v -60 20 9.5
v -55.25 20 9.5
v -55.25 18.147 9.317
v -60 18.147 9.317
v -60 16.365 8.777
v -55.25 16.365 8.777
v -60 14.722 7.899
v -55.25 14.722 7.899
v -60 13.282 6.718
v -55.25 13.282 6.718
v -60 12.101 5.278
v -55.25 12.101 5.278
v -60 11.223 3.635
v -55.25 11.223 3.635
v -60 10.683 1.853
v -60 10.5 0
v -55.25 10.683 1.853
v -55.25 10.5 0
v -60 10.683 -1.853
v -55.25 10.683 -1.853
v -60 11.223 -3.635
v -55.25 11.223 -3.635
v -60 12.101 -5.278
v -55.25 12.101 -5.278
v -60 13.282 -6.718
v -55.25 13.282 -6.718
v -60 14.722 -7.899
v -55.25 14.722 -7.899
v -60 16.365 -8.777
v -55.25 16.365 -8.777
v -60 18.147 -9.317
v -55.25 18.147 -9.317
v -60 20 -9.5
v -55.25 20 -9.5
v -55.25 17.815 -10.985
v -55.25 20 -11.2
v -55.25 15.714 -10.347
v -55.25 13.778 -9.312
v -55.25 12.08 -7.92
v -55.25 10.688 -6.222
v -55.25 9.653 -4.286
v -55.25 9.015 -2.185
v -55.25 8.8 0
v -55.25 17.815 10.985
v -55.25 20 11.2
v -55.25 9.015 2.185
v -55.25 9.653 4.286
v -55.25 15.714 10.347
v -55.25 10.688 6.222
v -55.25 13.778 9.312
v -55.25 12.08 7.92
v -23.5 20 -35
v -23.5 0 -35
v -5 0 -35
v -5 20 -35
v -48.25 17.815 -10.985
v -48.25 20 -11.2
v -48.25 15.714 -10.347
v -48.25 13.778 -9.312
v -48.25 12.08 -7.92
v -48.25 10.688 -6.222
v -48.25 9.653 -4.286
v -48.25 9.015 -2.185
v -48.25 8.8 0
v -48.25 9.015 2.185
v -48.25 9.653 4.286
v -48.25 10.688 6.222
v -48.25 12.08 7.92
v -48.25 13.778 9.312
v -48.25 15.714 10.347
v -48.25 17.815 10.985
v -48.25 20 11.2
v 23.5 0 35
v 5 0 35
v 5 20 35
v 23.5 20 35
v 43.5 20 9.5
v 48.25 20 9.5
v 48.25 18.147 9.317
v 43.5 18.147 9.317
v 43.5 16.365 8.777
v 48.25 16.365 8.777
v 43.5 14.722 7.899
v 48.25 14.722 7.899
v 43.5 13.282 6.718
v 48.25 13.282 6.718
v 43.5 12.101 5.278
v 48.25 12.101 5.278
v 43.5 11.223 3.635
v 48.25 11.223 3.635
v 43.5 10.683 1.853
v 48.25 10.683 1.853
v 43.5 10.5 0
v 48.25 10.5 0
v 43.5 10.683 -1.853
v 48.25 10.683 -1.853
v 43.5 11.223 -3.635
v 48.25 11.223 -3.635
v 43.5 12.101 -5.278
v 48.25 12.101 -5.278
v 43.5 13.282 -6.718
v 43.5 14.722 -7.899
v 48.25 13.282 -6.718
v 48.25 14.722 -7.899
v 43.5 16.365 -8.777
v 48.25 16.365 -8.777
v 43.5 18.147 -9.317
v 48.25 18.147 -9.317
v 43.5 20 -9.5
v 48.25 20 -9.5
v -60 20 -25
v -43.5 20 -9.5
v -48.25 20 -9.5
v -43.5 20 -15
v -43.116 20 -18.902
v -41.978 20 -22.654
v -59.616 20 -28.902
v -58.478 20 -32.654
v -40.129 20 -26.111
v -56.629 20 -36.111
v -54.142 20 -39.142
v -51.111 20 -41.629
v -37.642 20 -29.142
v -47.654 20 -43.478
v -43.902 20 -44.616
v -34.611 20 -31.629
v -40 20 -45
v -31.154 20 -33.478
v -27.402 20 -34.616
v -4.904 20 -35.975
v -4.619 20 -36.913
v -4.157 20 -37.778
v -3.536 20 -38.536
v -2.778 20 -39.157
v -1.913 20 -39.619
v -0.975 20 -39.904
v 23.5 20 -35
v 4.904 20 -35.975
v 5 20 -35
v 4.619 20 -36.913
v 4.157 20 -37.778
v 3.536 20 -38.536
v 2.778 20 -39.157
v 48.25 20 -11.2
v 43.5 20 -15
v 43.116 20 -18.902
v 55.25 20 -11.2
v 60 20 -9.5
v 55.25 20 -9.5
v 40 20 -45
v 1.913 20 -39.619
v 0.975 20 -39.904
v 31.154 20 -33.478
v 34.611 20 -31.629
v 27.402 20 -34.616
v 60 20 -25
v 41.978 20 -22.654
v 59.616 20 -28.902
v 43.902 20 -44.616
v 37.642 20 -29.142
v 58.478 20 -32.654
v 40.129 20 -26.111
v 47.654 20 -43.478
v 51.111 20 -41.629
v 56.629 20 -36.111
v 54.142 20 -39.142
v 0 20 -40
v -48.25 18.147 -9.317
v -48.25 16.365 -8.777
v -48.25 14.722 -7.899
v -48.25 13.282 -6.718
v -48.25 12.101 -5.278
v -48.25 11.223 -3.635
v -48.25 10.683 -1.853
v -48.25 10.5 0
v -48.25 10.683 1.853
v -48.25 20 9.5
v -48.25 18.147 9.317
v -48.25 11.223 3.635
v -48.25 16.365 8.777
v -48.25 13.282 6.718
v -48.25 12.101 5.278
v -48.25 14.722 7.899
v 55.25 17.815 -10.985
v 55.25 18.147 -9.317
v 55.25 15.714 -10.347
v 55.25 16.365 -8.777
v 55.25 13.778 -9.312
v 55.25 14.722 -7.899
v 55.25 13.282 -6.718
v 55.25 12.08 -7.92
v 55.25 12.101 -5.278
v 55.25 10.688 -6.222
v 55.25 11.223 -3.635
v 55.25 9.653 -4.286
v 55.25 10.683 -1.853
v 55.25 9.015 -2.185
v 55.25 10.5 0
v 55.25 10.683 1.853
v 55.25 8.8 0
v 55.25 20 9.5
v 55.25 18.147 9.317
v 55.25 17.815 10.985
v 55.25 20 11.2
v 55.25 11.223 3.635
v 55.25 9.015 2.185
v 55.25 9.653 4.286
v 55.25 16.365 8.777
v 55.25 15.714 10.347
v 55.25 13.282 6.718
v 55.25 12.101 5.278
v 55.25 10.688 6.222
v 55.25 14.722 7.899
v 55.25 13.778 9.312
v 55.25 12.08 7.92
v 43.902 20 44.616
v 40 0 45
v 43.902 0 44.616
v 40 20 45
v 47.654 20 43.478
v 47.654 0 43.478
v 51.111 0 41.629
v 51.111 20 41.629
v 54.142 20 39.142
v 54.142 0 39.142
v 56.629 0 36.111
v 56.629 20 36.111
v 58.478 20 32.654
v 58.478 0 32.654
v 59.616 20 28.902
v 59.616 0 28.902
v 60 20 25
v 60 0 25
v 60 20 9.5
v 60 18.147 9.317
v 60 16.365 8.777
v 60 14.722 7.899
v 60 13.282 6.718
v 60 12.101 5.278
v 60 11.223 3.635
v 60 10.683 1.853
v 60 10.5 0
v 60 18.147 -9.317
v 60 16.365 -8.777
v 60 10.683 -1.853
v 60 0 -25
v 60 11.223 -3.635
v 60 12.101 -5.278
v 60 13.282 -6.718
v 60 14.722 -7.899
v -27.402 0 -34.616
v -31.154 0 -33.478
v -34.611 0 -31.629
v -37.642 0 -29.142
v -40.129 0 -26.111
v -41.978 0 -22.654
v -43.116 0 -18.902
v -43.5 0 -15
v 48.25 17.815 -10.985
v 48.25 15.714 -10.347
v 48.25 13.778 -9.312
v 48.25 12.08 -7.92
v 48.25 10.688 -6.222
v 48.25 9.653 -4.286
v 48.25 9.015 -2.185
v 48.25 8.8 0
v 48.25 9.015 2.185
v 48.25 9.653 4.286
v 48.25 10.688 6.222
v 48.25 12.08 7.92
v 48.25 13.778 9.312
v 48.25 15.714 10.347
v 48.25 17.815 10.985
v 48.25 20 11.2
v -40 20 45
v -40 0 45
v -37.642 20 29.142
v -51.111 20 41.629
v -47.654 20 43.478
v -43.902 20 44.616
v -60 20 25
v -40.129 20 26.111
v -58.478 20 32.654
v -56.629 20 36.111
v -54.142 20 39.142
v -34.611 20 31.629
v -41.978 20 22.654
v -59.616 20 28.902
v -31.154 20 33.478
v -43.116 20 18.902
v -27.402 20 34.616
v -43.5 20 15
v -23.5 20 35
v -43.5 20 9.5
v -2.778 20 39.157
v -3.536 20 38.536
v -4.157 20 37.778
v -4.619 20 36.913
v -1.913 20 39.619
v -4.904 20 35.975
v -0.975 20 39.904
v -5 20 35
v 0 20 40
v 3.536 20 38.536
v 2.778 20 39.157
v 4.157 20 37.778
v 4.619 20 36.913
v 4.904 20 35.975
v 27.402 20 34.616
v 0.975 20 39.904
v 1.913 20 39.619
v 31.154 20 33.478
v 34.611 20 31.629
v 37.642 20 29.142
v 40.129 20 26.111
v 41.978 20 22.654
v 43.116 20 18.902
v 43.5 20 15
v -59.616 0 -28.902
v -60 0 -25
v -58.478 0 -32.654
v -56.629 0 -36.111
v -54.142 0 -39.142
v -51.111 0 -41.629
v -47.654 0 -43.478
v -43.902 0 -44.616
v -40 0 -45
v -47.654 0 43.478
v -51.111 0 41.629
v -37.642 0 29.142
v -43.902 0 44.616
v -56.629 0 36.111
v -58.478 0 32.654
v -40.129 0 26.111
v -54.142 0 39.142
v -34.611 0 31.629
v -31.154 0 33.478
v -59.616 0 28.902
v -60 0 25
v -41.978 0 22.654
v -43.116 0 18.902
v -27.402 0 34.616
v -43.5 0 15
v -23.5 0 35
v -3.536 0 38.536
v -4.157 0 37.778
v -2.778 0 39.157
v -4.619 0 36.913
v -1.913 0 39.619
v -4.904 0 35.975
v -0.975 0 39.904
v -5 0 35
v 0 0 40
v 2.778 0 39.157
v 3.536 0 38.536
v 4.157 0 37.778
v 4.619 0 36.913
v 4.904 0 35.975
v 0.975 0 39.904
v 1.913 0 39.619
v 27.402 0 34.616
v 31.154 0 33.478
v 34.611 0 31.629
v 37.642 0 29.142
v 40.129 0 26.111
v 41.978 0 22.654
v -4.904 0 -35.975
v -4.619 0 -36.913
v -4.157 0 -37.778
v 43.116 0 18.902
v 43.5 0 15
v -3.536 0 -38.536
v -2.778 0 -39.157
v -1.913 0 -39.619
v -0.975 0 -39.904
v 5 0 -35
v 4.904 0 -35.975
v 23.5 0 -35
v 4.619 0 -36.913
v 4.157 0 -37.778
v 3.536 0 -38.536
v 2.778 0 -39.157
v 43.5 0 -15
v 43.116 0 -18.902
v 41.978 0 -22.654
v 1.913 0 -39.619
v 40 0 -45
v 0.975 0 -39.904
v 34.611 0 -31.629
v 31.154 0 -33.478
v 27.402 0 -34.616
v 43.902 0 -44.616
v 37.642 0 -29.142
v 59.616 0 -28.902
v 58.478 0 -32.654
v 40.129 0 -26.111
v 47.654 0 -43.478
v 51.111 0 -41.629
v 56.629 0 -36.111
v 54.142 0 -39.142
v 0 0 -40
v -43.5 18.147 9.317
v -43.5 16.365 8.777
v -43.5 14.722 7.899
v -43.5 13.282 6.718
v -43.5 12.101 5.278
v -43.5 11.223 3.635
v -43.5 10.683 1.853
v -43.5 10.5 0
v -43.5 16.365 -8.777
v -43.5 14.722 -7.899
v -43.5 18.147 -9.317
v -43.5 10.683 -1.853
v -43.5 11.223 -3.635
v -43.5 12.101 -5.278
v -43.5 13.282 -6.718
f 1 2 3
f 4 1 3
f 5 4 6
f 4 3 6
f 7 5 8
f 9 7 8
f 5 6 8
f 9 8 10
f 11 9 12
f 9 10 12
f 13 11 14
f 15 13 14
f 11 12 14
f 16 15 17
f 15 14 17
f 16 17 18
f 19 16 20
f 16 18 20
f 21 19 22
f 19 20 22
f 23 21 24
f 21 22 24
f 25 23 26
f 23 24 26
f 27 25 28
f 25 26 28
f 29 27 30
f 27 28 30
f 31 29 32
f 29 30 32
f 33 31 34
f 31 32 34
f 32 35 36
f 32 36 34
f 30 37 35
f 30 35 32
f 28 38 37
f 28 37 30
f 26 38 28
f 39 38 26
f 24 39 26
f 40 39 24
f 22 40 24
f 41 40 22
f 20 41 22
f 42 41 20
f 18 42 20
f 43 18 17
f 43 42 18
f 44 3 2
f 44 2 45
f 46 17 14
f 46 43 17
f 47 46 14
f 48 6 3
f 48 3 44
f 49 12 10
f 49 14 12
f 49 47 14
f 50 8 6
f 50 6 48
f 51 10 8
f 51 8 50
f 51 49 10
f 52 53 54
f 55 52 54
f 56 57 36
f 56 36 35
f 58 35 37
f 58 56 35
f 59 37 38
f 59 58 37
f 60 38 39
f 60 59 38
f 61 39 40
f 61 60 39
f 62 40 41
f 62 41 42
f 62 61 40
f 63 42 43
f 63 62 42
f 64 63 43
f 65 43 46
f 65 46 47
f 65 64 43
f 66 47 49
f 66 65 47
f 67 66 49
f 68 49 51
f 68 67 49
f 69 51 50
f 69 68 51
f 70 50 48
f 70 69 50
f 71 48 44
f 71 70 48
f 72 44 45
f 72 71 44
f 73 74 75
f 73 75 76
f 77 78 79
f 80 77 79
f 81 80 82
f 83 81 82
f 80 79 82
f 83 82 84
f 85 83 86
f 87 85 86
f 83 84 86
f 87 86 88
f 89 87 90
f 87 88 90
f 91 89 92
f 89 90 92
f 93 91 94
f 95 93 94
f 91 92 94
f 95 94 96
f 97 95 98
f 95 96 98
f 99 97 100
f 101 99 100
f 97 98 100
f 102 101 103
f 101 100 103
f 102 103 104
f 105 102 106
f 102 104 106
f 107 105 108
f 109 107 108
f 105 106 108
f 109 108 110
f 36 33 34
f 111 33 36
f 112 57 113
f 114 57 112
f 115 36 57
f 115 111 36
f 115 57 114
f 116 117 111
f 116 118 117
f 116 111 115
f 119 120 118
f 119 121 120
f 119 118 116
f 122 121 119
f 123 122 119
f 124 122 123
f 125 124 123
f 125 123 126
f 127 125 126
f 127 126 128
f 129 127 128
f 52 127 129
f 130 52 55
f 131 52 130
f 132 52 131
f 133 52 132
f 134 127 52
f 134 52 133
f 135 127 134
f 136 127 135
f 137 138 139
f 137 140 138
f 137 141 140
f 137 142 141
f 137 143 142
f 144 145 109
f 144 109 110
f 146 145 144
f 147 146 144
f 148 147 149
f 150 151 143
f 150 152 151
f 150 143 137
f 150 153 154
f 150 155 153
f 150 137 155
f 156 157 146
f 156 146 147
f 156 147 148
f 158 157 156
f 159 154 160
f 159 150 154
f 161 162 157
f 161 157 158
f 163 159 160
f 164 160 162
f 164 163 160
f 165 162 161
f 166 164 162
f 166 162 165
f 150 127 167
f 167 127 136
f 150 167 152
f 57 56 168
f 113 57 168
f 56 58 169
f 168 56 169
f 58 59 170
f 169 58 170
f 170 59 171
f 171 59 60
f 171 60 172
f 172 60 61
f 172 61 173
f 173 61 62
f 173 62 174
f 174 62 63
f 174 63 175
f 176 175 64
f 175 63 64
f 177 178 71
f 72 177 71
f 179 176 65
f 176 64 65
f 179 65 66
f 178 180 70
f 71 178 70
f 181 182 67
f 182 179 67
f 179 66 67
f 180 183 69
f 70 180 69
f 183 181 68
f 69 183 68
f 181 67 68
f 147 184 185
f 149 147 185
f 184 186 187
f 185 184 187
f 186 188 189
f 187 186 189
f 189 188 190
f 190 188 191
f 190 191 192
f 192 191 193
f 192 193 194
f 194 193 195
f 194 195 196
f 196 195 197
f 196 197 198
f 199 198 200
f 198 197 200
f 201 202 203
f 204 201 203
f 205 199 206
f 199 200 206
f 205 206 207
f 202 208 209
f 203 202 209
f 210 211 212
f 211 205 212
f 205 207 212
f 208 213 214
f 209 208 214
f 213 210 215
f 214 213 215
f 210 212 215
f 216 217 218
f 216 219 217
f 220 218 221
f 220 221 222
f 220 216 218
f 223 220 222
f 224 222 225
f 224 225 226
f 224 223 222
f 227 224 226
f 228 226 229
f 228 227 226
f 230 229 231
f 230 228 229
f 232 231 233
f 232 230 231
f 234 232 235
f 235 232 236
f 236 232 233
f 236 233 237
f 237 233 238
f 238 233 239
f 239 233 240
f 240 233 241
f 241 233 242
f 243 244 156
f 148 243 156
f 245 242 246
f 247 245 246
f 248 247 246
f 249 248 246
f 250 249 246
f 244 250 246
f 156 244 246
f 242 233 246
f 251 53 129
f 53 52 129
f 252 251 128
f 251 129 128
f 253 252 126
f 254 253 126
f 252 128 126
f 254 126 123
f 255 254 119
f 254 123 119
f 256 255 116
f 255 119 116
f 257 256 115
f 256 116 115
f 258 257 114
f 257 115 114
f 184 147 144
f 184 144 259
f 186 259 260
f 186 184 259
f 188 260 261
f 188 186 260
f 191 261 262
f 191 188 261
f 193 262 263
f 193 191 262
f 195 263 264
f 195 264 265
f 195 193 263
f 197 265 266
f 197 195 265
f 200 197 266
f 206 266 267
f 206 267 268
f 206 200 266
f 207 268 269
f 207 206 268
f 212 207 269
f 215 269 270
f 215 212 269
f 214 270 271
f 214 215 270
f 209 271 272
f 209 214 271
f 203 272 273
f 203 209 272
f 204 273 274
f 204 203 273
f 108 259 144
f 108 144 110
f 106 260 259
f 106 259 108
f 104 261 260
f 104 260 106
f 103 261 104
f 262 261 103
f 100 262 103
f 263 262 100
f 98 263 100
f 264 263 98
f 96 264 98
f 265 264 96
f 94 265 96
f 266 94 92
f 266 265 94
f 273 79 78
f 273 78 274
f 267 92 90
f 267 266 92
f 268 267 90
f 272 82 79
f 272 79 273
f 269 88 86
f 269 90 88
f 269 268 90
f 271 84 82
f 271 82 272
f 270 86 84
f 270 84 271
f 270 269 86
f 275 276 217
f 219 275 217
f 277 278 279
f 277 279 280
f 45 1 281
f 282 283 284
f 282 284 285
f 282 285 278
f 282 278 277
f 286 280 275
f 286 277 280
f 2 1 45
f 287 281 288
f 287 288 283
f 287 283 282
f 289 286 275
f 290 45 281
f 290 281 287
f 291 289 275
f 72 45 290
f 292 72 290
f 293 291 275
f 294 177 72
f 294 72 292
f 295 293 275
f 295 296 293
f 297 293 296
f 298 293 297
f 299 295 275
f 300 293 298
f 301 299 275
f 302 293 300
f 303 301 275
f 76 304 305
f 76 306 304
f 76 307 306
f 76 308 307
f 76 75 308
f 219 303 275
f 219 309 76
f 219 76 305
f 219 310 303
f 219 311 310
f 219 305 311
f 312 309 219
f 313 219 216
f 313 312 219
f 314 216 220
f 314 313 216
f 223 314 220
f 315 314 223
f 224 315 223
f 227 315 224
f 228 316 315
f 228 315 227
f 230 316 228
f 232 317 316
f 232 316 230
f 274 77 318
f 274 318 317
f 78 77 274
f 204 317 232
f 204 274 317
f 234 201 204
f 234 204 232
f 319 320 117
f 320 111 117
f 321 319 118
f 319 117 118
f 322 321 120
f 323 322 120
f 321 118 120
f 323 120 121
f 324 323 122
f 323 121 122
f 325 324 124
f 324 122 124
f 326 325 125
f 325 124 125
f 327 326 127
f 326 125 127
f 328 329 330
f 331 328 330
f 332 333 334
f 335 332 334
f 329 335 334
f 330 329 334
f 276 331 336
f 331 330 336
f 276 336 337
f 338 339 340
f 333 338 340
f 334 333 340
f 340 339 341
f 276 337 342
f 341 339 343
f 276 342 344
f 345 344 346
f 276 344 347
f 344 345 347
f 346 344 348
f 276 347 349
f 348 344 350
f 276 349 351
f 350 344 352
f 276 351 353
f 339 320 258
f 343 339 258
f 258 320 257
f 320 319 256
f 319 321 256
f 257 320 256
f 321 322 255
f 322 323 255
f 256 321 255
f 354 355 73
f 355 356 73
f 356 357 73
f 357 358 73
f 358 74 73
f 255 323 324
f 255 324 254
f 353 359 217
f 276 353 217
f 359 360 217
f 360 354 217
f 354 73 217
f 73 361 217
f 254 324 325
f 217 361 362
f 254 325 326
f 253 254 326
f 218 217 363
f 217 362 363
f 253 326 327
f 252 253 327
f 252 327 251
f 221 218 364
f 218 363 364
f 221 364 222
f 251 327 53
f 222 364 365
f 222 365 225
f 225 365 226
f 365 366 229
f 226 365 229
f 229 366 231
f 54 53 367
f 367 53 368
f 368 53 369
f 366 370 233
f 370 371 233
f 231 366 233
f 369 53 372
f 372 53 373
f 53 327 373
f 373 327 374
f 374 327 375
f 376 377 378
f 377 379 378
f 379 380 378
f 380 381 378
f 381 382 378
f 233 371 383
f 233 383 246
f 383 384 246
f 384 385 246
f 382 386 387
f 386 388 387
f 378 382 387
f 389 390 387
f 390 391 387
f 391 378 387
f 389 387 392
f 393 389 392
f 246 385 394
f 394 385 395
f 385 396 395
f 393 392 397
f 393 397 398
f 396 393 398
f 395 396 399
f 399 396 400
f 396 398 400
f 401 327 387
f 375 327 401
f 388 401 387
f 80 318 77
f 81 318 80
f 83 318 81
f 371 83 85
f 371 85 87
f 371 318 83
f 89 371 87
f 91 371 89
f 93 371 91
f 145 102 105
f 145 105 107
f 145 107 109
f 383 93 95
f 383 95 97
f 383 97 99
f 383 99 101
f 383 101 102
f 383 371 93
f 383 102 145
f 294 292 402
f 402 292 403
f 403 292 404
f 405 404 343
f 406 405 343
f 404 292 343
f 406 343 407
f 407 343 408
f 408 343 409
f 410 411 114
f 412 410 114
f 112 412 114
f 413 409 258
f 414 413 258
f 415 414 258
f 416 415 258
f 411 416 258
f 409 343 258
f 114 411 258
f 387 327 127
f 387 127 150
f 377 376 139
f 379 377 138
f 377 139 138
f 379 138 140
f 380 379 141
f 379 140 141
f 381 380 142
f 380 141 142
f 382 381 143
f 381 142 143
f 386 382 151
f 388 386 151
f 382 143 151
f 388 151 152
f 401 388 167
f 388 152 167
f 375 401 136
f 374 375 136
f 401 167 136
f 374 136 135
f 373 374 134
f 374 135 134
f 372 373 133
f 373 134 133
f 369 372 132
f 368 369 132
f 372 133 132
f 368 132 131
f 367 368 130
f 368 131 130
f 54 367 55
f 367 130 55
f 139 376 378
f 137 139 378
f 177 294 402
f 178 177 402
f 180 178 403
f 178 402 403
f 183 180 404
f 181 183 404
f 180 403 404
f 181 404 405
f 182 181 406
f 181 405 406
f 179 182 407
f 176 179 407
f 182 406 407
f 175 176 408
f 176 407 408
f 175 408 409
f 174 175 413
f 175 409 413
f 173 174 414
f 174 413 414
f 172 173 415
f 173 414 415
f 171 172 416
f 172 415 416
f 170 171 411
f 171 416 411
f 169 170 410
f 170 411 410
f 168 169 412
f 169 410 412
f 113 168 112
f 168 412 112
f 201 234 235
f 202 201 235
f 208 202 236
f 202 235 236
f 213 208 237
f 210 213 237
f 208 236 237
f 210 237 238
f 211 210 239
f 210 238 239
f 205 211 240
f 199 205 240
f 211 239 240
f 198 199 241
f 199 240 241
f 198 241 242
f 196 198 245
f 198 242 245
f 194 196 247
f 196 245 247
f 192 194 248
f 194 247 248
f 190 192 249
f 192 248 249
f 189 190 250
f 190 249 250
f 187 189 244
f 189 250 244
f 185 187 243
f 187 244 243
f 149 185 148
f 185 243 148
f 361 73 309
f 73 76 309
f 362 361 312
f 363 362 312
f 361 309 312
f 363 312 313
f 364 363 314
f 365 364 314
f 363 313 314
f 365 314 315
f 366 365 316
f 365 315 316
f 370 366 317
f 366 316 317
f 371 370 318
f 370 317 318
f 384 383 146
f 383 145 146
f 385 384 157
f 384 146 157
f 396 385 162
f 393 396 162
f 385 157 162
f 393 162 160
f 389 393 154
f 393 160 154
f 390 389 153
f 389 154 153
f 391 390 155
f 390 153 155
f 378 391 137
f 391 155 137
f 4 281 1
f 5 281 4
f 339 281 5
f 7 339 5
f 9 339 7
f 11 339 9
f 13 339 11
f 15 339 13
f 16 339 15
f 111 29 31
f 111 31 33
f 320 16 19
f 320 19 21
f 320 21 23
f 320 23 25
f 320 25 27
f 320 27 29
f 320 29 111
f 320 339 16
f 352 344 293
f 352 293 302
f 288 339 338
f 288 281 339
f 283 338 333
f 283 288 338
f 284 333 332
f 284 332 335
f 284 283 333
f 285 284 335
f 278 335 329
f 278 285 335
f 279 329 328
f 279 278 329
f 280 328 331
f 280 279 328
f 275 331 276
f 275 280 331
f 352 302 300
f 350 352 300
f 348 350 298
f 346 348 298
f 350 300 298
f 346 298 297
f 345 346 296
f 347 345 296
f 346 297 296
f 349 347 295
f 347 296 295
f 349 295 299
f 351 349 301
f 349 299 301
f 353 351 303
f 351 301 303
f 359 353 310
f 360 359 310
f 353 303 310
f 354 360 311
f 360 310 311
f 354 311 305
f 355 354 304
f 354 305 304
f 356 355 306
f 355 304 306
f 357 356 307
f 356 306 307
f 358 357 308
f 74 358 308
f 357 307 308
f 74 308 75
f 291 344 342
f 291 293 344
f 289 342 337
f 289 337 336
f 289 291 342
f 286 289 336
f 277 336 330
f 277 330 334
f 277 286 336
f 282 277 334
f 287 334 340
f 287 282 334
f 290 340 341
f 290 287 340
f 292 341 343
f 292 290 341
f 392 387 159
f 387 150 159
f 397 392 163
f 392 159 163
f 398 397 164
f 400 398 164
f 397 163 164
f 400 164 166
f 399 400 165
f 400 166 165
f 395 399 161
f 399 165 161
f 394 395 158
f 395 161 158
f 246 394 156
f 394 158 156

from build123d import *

# Parameters (mm, degrees)
SKETCH2_W           = 120
SKETCH2_H           = 90
SKETCH2_W_2         = 87
SKETCH2_H_2         = 70
BOSS_EXTRUDE1_DEPTH = 20
SKETCH3_W           = 7
SKETCH3_H           = 11.2
SKETCH4_R           = 9.5
CUT_EXTRUDE1_DEPTH  = 121
FILLET1_R           = 20
SKETCH5_R           = 5
CUT_EXTRUDE2_DEPTH  = 21


with BuildPart() as part:
    # Sketch2 → Boss-Extrude1 (new body)
    with BuildSketch(Plane(origin=(0, 0, 0), x_dir=(1, 0, 0), z_dir=(0, 1, 0))):
        Rectangle(SKETCH2_W, SKETCH2_H)
        Rectangle(SKETCH2_W_2, SKETCH2_H_2, mode=Mode.SUBTRACT)
    extrude(amount=BOSS_EXTRUDE1_DEPTH)

    # Sketch3 → Cut-Revolve1 (revolve, cut)
    with BuildSketch(Plane(origin=(0, 20, 0), x_dir=(1, 0, 0), z_dir=(0, 1, 0))):
        with Locations((-51.75, 5.6)):
            Rectangle(SKETCH3_W, SKETCH3_H)
        with Locations((51.75, 5.6)):
            Rectangle(SKETCH3_W, SKETCH3_H)
    revolve(axis=Axis((55.25, 20, 0), (-1, 0, 0)), mode=Mode.SUBTRACT)

    # Sketch4 → Cut-Extrude1 (cut, through all)
    with BuildSketch(Plane(origin=(60, 0, 0), x_dir=(0, 0, -1), z_dir=(1, 0, 0))):
        with Locations((0, 20)):
            Circle(SKETCH4_R)
    extrude(amount=-CUT_EXTRUDE1_DEPTH, mode=Mode.SUBTRACT)

    # Fillet1
    fillet1_edges = [part.edges().sort_by_distance(p)[0] for p in [
        (-43.5, 10, -35),
        (-43.5, 10, 35),
        (43.5, 10, 35),
        (43.5, 10, -35),
        (-60, 10, -45),
        (60, 10, -45),
        (60, 10, 45),
        (-60, 10, 45),
    ]]
    fillet(fillet1_edges, radius=FILLET1_R)

    # Sketch5 → Cut-Extrude2 (cut, through all)
    with BuildSketch(Plane(origin=(0, 20, 0), x_dir=(1, 0, 0), z_dir=(0, 1, 0))):
        with Locations((0, -35)):
            Circle(SKETCH5_R)
        with Locations((0, 35)):
            Circle(SKETCH5_R)
    extrude(amount=-CUT_EXTRUDE2_DEPTH, mode=Mode.SUBTRACT)


solid = part.part
